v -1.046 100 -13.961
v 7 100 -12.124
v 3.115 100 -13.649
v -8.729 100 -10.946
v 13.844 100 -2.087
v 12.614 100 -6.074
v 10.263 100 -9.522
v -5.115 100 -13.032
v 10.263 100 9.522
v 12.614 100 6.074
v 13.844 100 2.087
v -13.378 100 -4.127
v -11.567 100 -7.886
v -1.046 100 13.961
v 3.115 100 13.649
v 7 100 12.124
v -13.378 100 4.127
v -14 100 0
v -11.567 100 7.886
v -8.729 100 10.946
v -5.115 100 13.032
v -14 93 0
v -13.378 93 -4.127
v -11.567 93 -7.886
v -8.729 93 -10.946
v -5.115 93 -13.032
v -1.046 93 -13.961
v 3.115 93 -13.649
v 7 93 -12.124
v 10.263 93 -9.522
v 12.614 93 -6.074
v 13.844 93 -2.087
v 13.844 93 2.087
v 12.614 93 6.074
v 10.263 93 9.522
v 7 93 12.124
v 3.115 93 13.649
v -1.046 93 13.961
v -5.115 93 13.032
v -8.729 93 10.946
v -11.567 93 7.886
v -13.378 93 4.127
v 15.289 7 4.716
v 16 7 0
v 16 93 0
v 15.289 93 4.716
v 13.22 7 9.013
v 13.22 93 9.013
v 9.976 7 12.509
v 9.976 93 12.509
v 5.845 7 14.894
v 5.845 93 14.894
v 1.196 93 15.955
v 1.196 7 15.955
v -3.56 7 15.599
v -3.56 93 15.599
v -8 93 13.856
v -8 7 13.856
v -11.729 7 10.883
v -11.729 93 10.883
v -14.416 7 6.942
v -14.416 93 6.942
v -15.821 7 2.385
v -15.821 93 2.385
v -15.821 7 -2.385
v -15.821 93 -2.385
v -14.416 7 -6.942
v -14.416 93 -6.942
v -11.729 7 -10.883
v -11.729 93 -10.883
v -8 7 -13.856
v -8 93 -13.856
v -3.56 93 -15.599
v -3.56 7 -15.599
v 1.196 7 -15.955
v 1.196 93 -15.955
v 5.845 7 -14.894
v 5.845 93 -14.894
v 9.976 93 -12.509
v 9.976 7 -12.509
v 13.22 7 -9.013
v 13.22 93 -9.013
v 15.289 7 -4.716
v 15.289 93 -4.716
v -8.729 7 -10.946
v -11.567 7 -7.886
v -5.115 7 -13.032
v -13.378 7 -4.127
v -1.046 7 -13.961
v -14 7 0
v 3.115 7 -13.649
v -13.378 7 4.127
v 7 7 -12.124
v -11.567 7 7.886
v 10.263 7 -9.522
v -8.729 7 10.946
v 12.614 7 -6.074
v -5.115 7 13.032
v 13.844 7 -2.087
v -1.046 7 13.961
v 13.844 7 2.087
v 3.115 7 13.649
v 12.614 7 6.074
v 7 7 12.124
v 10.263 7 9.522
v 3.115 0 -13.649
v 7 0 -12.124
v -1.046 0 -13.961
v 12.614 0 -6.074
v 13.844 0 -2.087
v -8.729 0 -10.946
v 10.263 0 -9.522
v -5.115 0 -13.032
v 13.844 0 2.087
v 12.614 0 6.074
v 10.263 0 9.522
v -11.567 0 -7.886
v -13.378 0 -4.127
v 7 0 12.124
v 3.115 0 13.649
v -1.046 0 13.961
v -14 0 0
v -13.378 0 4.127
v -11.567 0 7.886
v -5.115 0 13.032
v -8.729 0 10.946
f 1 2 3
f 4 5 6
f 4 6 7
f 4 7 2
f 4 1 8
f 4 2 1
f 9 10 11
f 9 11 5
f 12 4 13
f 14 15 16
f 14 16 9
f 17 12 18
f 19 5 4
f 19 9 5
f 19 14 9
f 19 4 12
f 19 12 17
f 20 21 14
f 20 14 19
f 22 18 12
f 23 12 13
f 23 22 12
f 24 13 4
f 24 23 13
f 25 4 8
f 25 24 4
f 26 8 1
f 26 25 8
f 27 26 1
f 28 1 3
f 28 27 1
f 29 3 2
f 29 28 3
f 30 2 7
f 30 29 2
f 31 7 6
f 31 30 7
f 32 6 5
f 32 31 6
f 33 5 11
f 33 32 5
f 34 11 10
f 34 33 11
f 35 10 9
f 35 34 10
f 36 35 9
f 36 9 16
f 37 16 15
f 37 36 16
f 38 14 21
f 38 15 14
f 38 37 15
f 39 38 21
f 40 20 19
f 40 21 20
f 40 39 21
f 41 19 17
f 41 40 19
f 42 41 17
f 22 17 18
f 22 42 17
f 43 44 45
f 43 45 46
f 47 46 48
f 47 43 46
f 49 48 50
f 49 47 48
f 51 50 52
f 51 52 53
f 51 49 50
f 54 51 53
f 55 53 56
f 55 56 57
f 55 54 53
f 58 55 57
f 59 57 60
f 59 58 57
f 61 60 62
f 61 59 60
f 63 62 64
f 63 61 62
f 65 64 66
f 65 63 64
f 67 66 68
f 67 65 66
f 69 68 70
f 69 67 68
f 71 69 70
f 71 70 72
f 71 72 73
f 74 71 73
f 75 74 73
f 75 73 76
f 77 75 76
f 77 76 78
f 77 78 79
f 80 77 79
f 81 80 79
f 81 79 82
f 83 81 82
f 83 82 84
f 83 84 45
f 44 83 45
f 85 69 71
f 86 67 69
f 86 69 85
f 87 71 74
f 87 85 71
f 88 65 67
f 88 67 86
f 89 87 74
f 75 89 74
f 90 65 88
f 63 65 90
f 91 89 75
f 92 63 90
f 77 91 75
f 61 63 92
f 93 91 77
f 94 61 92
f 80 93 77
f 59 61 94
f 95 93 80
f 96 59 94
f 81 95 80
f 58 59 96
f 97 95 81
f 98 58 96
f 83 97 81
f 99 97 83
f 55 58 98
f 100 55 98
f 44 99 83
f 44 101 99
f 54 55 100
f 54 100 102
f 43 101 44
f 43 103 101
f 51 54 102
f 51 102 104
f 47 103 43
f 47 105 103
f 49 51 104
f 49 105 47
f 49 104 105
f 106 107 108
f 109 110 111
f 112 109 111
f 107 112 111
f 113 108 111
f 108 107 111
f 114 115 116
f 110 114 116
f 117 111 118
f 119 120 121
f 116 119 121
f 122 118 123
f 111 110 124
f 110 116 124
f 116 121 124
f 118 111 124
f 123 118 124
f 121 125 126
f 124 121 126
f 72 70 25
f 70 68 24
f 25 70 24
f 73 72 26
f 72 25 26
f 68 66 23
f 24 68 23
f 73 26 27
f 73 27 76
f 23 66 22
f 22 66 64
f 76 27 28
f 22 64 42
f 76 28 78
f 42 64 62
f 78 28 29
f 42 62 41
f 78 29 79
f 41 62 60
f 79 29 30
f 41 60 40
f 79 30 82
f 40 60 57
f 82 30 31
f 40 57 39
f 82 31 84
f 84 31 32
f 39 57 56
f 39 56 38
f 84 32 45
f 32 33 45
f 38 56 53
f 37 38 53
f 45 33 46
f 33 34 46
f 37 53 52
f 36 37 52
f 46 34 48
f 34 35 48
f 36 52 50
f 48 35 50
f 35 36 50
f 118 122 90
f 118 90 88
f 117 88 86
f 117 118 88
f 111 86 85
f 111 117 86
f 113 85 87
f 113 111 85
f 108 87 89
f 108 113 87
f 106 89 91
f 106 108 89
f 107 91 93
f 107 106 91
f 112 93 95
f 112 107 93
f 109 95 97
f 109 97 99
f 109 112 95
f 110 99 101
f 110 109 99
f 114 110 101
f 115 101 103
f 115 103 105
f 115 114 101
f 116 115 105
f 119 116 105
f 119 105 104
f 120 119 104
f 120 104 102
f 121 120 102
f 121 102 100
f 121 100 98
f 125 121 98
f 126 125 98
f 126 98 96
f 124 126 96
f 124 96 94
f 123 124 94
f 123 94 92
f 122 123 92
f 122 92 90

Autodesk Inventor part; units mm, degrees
ref_plane "YZ Plane" through (0, 0, 0) normal (1, 0, 0) x (0, 1, 0)
ref_plane "XZ Plane" through (0, 0, 0) normal (0, 1, 0) x (-1, 0, 0)
sketch "Sketch1" plane through (0, 0, 0) normal (0, 1, 0) x (-1, 0, 0)
  circle A0 centre (0, 0) radius 14
  dimension "d0" = 28
extrude "Extrusion1" add sketch "Sketch1" along normal blind 100
ref_plane "Work Plane1" through (0, 7, 0) normal (0, -1, 0) x (1, 0, 0)
sketch "Sketch2" plane through (0, 7, 0) normal (0, -1, 0) x (1, 0, 0)
  circle A0 centre (0, 0) radius 16
  dimension "d4" = 32
extrude "Extrusion2" add sketch "Sketch2" against normal blind 86
thread "Thread1" size "M30x1.5" class "6g" standard "ANSI Metric M Profile" length 7
thread "Thread2" size "M30x1.5" class "6g" standard "ANSI Metric M Profile" length 7
properties part number "Support Tube (Filament Holder" material "ABS Plastic"
